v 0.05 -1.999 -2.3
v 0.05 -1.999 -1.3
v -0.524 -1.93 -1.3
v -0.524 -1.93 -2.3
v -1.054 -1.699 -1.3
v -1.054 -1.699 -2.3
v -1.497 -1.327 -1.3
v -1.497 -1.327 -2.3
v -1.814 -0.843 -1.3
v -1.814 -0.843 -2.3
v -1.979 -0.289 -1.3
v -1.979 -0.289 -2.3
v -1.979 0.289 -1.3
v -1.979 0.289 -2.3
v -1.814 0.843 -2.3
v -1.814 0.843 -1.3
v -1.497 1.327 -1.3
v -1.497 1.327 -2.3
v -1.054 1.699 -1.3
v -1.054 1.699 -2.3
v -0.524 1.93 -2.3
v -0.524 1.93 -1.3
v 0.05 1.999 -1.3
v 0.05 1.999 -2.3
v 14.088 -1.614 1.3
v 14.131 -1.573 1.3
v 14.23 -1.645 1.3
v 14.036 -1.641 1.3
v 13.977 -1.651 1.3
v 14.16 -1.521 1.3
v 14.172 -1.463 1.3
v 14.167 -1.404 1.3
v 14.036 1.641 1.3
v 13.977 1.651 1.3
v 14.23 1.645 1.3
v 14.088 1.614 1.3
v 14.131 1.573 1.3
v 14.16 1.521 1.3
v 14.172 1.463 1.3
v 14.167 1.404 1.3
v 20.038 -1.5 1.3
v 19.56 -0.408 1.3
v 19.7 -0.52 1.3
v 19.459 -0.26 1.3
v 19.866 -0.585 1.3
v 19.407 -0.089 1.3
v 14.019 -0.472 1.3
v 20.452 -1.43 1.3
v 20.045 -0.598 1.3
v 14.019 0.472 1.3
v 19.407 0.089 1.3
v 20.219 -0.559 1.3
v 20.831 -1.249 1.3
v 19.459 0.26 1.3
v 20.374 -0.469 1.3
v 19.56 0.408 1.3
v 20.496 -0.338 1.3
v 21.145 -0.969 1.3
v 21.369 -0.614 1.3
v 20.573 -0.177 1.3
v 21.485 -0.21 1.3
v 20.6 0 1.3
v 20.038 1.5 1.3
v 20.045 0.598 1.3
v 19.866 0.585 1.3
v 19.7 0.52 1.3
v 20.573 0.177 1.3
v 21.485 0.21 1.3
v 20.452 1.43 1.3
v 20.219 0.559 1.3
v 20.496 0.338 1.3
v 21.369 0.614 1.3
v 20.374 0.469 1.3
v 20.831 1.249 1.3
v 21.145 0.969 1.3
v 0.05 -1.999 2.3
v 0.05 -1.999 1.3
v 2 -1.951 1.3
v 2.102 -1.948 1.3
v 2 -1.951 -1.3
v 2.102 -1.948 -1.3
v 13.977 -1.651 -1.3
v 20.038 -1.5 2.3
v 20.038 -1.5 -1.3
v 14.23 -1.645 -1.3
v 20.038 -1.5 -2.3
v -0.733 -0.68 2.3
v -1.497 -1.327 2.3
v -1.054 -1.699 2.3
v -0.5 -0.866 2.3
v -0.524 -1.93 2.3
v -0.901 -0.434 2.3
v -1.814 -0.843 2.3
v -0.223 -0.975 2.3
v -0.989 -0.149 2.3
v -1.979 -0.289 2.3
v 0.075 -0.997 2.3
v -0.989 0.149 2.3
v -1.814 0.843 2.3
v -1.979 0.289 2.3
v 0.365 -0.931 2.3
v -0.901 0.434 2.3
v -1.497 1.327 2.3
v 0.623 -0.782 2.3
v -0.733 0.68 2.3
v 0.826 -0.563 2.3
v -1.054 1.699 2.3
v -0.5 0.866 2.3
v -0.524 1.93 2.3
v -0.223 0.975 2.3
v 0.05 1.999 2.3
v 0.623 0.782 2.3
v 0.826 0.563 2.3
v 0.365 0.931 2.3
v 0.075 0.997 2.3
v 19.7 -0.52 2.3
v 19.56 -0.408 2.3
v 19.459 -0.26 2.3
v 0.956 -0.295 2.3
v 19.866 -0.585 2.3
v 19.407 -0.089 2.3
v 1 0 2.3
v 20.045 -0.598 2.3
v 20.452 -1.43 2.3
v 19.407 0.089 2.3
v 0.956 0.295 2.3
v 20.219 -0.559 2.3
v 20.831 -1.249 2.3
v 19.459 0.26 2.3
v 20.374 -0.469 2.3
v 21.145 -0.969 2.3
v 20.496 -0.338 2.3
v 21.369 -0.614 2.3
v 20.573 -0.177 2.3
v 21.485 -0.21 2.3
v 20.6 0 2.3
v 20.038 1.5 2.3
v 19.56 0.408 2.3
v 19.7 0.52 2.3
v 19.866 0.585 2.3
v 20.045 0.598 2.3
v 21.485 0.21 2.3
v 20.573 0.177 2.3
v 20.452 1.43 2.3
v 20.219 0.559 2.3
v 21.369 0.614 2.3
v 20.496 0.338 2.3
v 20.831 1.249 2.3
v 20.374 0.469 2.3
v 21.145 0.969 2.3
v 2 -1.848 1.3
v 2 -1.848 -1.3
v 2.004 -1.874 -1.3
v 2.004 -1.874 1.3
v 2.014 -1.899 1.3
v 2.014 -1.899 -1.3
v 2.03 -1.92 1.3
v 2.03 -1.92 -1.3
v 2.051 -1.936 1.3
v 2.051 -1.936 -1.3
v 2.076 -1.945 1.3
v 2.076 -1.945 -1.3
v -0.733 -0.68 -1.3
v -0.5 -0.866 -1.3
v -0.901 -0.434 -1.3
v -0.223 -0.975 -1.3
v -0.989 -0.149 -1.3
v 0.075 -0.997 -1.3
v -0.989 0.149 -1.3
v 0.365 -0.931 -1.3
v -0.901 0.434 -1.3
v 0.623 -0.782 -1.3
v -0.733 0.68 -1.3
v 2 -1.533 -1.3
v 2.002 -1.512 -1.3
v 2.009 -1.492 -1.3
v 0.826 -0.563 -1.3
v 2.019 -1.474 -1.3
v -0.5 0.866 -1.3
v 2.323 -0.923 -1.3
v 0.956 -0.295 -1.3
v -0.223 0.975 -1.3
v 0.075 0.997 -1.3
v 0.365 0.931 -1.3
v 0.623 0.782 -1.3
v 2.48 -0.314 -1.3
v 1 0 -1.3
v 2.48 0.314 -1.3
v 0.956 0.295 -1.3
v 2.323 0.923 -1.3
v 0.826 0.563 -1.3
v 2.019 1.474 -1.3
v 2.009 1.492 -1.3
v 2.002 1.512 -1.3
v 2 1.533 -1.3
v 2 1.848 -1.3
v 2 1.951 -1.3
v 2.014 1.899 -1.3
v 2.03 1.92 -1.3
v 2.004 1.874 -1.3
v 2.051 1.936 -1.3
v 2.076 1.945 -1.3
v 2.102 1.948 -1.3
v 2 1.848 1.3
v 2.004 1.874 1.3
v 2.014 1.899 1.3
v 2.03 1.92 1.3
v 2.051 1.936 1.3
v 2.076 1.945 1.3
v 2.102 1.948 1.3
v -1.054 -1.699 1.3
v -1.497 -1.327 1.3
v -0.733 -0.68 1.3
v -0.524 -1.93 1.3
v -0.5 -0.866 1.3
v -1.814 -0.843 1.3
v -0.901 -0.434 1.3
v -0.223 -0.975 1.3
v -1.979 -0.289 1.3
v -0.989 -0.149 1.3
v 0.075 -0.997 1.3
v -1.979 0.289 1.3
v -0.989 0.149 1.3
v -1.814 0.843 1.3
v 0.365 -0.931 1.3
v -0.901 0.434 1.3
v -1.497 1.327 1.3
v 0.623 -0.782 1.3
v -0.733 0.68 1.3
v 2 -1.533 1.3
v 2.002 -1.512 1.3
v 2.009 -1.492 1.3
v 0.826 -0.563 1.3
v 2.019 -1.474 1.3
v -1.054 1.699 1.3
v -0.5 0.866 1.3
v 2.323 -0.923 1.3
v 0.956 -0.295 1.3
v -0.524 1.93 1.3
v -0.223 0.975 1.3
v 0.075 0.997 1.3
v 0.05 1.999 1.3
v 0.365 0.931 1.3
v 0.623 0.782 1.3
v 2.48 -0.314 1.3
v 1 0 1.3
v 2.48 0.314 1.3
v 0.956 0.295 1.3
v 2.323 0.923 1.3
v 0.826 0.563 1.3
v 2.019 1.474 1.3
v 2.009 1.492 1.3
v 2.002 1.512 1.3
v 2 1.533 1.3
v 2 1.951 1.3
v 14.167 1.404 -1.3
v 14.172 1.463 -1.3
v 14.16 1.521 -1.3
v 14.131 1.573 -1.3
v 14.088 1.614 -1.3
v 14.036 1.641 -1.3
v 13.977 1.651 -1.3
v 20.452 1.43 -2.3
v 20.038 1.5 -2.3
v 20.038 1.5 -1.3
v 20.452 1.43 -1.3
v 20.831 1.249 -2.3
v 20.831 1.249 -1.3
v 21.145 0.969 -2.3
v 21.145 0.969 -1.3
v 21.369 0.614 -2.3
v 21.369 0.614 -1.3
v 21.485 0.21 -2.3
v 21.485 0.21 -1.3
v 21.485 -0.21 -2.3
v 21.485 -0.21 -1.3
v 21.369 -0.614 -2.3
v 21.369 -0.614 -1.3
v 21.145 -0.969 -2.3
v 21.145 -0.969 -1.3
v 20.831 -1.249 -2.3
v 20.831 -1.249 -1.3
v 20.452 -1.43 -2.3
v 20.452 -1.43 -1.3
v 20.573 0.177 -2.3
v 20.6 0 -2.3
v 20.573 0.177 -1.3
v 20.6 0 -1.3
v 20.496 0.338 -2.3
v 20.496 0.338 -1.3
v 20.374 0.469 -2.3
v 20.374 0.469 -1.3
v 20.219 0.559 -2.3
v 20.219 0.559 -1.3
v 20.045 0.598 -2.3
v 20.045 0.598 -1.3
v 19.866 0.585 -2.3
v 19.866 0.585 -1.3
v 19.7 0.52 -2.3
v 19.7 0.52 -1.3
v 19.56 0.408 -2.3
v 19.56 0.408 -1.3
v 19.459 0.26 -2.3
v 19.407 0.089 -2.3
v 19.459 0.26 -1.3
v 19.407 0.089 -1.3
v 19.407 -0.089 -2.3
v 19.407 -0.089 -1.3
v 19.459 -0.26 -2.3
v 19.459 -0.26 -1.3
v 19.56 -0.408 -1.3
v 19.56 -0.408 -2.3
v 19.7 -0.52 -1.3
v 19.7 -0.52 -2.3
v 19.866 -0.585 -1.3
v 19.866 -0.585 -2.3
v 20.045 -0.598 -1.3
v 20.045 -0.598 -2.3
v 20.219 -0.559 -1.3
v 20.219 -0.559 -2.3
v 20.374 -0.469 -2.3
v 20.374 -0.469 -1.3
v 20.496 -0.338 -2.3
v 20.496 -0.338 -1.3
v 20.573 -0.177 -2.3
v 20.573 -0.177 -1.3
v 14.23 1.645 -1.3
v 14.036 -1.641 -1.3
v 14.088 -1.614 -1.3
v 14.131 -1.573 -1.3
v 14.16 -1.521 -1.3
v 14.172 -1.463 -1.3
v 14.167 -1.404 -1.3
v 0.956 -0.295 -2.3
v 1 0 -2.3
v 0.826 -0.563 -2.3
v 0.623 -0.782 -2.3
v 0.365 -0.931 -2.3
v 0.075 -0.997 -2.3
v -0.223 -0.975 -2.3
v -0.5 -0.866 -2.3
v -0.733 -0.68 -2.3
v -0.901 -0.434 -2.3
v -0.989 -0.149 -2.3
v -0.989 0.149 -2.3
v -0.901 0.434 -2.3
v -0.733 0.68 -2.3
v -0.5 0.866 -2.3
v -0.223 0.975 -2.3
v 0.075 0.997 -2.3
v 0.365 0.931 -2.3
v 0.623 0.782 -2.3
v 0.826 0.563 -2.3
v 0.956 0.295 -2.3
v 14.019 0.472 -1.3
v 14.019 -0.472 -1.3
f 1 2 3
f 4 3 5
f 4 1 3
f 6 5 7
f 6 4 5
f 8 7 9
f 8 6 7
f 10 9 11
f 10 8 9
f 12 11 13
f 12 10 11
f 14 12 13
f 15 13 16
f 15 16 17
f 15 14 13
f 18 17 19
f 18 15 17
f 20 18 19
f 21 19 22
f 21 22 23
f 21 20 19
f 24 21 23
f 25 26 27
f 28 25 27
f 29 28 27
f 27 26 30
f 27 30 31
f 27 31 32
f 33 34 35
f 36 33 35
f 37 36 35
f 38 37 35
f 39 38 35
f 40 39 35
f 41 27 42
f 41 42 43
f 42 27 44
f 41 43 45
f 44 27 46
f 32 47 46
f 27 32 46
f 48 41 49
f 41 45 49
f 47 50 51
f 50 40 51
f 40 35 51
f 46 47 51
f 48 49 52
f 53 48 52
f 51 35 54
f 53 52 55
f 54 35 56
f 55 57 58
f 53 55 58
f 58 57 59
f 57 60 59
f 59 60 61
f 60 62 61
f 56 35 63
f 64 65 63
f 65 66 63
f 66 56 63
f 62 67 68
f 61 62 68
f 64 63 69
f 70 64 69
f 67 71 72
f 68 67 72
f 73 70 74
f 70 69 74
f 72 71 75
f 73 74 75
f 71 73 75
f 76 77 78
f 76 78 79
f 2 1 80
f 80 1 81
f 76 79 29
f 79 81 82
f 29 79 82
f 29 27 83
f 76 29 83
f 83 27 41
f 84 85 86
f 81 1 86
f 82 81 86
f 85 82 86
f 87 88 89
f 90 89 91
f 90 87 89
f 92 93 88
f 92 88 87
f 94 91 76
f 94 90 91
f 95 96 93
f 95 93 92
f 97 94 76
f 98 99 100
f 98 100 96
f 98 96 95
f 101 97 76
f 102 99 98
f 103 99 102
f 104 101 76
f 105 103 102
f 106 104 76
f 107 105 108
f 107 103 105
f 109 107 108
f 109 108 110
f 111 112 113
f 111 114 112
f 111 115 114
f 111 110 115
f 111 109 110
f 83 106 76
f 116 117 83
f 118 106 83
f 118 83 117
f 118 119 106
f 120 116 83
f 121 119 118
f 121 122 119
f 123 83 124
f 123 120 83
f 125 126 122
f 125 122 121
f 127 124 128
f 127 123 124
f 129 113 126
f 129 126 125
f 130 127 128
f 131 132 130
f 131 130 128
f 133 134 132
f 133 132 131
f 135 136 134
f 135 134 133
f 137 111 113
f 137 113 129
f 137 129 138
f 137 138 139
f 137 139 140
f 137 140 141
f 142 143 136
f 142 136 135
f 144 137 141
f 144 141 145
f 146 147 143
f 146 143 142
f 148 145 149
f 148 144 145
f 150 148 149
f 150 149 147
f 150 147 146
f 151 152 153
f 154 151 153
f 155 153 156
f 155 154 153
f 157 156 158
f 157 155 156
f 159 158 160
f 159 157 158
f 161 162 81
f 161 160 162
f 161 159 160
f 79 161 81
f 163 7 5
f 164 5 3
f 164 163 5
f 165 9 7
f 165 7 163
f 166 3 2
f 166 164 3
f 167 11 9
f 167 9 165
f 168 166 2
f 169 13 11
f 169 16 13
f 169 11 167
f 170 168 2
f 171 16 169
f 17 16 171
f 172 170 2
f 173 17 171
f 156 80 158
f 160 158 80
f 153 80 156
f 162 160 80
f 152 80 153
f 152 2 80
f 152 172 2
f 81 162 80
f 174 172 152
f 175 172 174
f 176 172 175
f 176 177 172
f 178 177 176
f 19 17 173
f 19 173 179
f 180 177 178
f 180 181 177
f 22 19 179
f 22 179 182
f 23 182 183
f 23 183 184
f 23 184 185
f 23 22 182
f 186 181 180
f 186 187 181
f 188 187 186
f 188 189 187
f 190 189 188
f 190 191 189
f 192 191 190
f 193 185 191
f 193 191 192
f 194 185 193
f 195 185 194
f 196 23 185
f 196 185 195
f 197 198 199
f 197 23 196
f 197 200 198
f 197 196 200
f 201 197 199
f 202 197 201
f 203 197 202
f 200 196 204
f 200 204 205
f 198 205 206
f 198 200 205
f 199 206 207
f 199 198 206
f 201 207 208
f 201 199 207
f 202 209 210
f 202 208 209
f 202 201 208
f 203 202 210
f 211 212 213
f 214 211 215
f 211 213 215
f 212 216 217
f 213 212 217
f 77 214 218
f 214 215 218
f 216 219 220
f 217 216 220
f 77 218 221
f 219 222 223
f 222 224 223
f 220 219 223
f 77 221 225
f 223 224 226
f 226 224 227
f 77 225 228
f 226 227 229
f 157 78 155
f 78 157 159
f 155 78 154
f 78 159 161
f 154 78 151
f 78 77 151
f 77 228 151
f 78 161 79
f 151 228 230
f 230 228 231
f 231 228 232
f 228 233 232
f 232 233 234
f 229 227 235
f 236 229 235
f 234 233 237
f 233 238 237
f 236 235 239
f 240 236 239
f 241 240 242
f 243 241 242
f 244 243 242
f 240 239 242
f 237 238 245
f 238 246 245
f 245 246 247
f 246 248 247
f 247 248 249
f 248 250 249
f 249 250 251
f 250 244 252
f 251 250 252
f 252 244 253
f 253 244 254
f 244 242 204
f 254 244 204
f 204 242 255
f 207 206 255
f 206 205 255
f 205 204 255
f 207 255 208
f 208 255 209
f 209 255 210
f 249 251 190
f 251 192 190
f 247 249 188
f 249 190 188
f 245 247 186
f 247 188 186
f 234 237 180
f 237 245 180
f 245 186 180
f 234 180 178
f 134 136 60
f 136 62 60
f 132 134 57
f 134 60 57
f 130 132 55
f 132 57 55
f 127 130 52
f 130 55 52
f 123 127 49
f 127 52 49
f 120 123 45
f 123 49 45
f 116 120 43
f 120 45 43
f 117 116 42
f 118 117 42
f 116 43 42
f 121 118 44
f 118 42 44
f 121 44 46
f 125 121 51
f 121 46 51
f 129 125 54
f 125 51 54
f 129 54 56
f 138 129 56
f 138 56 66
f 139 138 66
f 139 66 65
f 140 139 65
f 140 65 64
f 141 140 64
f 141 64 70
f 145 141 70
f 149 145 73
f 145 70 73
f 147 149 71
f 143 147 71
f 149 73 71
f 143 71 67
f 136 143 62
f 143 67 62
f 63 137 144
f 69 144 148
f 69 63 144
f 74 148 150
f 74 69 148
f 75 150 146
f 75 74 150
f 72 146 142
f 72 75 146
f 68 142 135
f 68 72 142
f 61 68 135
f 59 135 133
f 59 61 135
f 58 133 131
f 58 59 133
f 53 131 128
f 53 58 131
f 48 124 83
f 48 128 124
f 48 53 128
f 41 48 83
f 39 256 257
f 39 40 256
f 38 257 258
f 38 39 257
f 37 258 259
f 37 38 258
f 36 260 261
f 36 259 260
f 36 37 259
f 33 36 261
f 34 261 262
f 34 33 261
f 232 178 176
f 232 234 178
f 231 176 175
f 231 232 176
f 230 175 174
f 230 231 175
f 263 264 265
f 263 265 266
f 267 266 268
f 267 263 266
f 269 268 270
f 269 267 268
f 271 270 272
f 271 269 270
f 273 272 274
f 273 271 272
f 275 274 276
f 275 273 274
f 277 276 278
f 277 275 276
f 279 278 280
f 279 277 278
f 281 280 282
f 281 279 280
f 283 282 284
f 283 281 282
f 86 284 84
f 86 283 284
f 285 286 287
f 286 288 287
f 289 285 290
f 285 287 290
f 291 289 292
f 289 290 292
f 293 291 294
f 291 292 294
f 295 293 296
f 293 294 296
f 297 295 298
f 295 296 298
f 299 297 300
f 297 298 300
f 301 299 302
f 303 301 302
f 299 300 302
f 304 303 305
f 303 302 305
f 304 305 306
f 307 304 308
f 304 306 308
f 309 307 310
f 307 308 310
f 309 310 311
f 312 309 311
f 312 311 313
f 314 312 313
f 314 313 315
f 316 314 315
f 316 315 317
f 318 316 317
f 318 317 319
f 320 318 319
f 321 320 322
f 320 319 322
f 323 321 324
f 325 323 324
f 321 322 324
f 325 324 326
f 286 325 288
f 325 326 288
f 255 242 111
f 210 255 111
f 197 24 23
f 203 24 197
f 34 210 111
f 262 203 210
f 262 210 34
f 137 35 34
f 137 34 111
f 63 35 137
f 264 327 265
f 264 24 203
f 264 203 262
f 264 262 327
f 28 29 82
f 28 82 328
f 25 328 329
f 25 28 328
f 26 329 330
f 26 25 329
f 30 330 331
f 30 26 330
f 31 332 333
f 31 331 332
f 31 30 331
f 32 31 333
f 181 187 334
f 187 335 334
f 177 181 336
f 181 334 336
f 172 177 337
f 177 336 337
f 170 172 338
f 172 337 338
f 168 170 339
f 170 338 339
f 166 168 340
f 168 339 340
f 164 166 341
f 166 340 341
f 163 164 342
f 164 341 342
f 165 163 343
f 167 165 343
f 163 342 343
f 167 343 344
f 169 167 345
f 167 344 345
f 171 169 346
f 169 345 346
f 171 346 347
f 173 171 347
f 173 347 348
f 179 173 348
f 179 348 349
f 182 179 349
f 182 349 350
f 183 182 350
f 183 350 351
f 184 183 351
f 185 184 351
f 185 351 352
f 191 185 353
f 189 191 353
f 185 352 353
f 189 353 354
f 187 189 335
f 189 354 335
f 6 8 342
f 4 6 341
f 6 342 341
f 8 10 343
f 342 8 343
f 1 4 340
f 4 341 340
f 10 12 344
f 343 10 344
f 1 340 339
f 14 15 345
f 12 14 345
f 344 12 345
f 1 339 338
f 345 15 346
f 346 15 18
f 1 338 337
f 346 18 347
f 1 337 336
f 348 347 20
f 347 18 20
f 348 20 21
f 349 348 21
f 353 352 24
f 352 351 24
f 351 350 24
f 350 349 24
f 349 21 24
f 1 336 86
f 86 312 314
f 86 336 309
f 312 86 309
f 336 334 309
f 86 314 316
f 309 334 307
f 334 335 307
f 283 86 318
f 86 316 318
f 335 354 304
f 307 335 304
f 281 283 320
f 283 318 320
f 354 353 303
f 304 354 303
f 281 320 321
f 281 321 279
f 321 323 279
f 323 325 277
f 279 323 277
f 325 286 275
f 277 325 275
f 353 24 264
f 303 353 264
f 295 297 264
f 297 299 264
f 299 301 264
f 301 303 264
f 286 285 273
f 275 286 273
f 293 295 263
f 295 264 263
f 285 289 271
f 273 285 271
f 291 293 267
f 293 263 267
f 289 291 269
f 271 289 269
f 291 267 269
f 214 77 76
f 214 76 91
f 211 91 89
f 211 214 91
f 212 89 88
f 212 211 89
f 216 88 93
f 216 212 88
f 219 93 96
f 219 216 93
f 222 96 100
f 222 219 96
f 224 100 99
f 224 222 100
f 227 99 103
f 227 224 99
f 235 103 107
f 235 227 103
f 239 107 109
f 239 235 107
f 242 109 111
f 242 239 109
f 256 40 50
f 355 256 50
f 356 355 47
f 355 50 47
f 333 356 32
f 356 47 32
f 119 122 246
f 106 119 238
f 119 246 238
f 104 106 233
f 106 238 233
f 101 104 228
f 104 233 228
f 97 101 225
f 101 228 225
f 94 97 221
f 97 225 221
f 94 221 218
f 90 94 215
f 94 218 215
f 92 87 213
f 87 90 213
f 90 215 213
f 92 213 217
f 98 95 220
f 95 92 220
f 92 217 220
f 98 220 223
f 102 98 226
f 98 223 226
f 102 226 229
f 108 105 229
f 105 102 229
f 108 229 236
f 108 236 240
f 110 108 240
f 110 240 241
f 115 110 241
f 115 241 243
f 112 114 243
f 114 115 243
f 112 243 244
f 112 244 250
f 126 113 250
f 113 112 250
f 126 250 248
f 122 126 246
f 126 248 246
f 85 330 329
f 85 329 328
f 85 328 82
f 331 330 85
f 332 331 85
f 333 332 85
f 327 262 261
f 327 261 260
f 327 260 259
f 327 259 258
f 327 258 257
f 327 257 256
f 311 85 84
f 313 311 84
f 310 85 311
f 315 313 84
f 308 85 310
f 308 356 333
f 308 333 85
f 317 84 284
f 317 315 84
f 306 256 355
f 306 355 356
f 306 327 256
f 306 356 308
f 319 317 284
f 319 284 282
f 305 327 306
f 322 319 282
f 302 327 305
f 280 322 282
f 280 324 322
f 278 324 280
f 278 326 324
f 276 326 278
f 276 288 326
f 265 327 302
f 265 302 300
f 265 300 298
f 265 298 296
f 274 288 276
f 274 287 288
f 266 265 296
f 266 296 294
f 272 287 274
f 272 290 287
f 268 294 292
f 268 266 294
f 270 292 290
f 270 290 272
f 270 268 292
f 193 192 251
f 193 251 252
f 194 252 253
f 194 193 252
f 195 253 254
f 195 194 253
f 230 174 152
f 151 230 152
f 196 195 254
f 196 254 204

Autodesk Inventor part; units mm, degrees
ref_plane "YZ Plane" through (0, 0, 0) normal (1, 0, 0) x (0, 1, 0)
ref_plane "XZ Plane" through (0, 0, 0) normal (0, 1, 0) x (-1, 0, 0)
ref_plane "XY Plane" through (0, 0, 0) normal (0, 0, 1) x (1, 0, 0)
sketch "Sketch1" plane through (0, 0, 0) normal (0, 0, 1) x (1, 0, 0)
  circle A0 centre (0, 0) radius 2
  circle A1 centre (0, 0) radius 1
  line L0 (0, 0) -> (20, 0)
  circle A2 centre (20, 0) radius 1.5
  circle A3 centre (20, 0) radius 0.6
  line L1 (0.05, 1.9994) -> (20.0375, 1.4995)
  line L2 (0.05, -1.9994) -> (20.0375, -1.4995)
  dimension "d0" = 4
  dimension "d1" = 2
  dimension "d2" = 20
  dimension "d3" = 3
  dimension "d4" = 1.2
extrude "Extrusion1" add sketch "Sketch1" along normal mid plane 4.6
sketch "Sketch2" plane through (0, 0, 0) normal (0, 0, 1) x (1, 0, 0)
  line L0 (0, 0) -> (2, 0)
  line L1 (2, 0) -> (2, 1.9506)
  line L2 (20.0375, 1.4995) -> (0.05, 1.9994) projected
  line L3 (2, 0) -> (2, -1.9506)
  line L4 (0.05, -1.9994) -> (20.0375, -1.4995) projected
  circle A0 centre (0, 0) radius 2.5
  circle A1 centre (20, 0) radius 0.6 projected
  circle A2 centre (20, 0) radius 6
  point P0 (2, -1.5)
  point P1 (2, 1.5)
  point P2 (1.5495, 1.9619)
  point P3 (1.5495, -1.9619)
  dimension "d7" = 2
  dimension "d8" = 5
  dimension "d10" = 12
extrude "Extrusion2" cut sketch "Sketch2" along normal mid plane 2.6 contours L3 A0 L1 | L1 A0 L3 | A0 L2 L1 | L3 L4 A0 | A2
fillet "Fillet1" radius 0.1 4 edges at (2, 1.5, 0) (2, -1.5, 0) (2, 1.9506, 0) (2, -1.9506, 0)
fillet "Fillet2" radius 0.2 2 edges at (14.2298, 1.6448, 0) (14.2298, -1.6448, 0)
properties part number "New_ThinArm_second"
